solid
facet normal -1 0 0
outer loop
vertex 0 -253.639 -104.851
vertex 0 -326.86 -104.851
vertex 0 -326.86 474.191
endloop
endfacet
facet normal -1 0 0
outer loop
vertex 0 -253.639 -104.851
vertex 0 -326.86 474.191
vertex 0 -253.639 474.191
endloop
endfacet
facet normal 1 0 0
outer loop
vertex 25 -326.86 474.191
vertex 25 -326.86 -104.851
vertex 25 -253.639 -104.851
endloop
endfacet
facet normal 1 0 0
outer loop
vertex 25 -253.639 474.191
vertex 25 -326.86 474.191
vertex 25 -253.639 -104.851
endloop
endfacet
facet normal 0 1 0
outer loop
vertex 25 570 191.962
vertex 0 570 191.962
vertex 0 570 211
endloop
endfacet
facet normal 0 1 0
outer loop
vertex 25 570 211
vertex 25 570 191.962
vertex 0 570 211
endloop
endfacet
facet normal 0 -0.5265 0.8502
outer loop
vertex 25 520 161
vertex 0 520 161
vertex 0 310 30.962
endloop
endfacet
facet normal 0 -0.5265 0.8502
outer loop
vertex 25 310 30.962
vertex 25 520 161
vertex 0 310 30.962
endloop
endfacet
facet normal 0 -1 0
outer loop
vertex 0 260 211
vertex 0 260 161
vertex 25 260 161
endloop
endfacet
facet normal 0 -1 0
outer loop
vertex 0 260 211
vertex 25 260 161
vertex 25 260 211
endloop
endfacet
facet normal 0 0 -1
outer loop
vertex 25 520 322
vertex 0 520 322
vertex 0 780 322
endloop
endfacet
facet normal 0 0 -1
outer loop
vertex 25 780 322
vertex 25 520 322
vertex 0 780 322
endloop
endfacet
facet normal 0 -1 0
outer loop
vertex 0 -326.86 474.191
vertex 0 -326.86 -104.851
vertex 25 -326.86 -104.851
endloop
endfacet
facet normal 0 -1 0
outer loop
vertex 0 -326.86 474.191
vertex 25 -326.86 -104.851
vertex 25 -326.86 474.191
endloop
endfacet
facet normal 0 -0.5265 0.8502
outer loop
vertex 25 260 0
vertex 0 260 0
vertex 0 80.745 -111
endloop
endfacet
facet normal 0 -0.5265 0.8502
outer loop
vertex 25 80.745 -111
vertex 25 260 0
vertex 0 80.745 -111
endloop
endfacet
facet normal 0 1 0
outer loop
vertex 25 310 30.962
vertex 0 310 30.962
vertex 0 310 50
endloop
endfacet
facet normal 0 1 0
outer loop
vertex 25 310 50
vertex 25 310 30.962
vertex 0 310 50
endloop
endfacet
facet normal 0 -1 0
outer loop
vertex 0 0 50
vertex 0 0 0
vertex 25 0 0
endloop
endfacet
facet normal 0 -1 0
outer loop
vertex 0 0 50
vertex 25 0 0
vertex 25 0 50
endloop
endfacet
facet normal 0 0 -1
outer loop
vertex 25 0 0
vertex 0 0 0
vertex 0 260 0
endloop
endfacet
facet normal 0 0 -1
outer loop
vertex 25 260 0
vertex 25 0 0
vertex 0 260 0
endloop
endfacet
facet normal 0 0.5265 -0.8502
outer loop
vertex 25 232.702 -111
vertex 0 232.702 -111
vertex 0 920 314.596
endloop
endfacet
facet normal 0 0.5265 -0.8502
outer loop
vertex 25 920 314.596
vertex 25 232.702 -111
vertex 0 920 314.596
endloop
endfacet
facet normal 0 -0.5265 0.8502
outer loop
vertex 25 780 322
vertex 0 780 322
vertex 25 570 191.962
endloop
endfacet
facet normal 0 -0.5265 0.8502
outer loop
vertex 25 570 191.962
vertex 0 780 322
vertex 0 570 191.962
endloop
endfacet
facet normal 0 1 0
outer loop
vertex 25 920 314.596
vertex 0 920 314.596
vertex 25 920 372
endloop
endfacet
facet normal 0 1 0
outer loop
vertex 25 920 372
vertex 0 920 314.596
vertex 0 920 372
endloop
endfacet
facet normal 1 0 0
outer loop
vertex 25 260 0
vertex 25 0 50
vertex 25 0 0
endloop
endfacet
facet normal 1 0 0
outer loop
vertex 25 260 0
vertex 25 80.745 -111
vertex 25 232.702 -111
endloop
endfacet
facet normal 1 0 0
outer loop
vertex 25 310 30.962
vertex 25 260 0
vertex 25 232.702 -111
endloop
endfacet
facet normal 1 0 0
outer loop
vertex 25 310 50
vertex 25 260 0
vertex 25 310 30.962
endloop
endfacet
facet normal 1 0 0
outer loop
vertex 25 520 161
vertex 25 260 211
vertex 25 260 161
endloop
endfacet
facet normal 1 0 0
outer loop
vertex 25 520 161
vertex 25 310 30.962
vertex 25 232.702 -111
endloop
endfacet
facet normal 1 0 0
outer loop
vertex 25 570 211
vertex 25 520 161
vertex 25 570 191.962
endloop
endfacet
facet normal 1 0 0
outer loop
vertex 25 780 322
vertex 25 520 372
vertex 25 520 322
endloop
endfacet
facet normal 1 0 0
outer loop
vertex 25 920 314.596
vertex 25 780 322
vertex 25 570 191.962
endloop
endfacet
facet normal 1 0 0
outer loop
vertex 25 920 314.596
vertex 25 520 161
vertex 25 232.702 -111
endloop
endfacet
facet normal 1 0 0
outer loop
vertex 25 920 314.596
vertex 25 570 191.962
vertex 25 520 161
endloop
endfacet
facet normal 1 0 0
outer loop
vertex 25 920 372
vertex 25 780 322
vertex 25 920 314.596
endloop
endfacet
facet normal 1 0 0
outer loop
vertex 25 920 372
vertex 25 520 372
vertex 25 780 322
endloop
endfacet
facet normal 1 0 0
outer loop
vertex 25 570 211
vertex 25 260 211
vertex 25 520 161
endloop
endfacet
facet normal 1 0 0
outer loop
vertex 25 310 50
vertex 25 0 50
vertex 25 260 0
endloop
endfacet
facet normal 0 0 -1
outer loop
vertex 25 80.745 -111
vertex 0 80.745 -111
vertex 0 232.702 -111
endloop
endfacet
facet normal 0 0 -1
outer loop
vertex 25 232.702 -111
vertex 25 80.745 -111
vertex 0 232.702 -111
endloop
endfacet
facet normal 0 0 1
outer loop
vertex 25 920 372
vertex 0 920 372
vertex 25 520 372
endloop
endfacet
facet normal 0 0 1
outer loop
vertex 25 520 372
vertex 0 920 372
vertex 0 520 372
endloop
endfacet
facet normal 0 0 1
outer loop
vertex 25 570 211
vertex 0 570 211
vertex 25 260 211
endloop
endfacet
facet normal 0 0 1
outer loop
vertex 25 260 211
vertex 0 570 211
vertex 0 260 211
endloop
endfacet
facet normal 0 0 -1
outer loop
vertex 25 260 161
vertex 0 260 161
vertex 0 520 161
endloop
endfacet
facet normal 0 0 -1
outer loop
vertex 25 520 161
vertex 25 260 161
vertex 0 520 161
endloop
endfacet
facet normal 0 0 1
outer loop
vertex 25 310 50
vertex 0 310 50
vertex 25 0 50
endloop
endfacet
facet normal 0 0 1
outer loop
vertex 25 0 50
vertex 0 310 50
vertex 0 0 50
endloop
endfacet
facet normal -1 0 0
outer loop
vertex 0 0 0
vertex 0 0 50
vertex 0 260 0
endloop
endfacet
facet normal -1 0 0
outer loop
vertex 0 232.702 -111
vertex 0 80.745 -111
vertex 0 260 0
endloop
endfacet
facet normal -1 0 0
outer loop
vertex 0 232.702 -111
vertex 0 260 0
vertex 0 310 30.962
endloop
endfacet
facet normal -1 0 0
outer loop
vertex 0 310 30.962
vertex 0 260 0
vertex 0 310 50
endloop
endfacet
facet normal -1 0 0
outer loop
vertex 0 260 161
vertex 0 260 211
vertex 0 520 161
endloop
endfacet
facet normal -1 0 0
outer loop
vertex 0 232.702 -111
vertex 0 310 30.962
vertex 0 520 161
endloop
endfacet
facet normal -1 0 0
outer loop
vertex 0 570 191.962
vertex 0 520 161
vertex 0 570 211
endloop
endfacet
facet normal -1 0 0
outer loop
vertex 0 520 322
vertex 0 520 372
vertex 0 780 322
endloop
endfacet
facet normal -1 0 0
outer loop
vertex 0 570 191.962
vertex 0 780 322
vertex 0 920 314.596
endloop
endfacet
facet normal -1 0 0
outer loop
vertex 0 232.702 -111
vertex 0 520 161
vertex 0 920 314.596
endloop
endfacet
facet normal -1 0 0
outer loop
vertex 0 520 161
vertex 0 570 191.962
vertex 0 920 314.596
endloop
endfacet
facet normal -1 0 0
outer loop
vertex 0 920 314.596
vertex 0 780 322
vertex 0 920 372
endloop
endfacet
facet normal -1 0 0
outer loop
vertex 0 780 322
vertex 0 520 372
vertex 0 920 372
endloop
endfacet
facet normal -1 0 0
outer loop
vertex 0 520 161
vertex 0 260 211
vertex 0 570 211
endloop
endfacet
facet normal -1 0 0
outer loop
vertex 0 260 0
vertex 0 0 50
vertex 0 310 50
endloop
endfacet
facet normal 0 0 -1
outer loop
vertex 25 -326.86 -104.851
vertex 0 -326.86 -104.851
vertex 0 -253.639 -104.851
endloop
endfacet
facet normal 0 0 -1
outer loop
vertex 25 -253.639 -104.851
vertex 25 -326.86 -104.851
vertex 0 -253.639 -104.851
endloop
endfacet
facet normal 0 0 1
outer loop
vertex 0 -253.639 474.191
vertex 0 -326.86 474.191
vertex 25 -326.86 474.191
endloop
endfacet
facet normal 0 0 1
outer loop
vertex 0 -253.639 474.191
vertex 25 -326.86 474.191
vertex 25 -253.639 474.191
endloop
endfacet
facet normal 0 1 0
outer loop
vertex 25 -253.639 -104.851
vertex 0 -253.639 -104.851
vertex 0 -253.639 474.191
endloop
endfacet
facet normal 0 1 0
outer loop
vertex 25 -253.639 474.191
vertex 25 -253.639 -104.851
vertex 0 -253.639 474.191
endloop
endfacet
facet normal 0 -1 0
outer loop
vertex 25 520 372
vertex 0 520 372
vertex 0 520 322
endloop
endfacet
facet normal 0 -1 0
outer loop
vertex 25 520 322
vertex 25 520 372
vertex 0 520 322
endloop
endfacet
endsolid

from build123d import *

# Parameters (mm, degrees)
F0_W     = 260
F0_H     = 50
F1_DEPTH = 25
F0_W_2   = 73.221385479
F0_H_2   = 579.0414139628


with BuildPart() as f1:
    # F0 (on Right) → F1 (new body)
    with BuildSketch(Plane.YZ):
        with Locations((130, 25)):
            Rectangle(F0_W, F0_H)
        Polygon((310, 30.9615384615), (260, 0), (310, 0), align=None)
        Polygon((260, 50), (260, 0), (310, 30.9615384615), (310, 50), align=None)
        Polygon((310, 0), (260, 0), (80.7453416149, -111), (232.7016316881, -111), (302.1173746537, -68.0156360867), (562.1173746537, 92.9843639133), (920, 314.5962973008), (920, 322), (780, 322), (570, 191.9615384615), (570, 161), (520, 161), (310, 30.9615384615), align=None)
        with Locations((390, 186)):
            Rectangle(F0_W, F0_H)
        Polygon((570, 191.9615384615), (520, 161), (570, 161), align=None)
        Polygon((520, 211), (520, 161), (570, 191.9615384615), (570, 211), align=None)
        Polygon((520, 322), (780, 322), (920, 322), (920, 372), (520, 372), align=None)
    extrude(amount=F1_DEPTH)


with BuildPart() as f1b:
    # F0 (on Right) → F1, piece 2 (new body)
    with BuildSketch(Plane.YZ):
        with Locations((-290.2494966984, 184.6698261797)):
            Rectangle(F0_W_2, F0_H_2)
    extrude(amount=F1_DEPTH)


solid = Compound([f1.part, f1b.part])
